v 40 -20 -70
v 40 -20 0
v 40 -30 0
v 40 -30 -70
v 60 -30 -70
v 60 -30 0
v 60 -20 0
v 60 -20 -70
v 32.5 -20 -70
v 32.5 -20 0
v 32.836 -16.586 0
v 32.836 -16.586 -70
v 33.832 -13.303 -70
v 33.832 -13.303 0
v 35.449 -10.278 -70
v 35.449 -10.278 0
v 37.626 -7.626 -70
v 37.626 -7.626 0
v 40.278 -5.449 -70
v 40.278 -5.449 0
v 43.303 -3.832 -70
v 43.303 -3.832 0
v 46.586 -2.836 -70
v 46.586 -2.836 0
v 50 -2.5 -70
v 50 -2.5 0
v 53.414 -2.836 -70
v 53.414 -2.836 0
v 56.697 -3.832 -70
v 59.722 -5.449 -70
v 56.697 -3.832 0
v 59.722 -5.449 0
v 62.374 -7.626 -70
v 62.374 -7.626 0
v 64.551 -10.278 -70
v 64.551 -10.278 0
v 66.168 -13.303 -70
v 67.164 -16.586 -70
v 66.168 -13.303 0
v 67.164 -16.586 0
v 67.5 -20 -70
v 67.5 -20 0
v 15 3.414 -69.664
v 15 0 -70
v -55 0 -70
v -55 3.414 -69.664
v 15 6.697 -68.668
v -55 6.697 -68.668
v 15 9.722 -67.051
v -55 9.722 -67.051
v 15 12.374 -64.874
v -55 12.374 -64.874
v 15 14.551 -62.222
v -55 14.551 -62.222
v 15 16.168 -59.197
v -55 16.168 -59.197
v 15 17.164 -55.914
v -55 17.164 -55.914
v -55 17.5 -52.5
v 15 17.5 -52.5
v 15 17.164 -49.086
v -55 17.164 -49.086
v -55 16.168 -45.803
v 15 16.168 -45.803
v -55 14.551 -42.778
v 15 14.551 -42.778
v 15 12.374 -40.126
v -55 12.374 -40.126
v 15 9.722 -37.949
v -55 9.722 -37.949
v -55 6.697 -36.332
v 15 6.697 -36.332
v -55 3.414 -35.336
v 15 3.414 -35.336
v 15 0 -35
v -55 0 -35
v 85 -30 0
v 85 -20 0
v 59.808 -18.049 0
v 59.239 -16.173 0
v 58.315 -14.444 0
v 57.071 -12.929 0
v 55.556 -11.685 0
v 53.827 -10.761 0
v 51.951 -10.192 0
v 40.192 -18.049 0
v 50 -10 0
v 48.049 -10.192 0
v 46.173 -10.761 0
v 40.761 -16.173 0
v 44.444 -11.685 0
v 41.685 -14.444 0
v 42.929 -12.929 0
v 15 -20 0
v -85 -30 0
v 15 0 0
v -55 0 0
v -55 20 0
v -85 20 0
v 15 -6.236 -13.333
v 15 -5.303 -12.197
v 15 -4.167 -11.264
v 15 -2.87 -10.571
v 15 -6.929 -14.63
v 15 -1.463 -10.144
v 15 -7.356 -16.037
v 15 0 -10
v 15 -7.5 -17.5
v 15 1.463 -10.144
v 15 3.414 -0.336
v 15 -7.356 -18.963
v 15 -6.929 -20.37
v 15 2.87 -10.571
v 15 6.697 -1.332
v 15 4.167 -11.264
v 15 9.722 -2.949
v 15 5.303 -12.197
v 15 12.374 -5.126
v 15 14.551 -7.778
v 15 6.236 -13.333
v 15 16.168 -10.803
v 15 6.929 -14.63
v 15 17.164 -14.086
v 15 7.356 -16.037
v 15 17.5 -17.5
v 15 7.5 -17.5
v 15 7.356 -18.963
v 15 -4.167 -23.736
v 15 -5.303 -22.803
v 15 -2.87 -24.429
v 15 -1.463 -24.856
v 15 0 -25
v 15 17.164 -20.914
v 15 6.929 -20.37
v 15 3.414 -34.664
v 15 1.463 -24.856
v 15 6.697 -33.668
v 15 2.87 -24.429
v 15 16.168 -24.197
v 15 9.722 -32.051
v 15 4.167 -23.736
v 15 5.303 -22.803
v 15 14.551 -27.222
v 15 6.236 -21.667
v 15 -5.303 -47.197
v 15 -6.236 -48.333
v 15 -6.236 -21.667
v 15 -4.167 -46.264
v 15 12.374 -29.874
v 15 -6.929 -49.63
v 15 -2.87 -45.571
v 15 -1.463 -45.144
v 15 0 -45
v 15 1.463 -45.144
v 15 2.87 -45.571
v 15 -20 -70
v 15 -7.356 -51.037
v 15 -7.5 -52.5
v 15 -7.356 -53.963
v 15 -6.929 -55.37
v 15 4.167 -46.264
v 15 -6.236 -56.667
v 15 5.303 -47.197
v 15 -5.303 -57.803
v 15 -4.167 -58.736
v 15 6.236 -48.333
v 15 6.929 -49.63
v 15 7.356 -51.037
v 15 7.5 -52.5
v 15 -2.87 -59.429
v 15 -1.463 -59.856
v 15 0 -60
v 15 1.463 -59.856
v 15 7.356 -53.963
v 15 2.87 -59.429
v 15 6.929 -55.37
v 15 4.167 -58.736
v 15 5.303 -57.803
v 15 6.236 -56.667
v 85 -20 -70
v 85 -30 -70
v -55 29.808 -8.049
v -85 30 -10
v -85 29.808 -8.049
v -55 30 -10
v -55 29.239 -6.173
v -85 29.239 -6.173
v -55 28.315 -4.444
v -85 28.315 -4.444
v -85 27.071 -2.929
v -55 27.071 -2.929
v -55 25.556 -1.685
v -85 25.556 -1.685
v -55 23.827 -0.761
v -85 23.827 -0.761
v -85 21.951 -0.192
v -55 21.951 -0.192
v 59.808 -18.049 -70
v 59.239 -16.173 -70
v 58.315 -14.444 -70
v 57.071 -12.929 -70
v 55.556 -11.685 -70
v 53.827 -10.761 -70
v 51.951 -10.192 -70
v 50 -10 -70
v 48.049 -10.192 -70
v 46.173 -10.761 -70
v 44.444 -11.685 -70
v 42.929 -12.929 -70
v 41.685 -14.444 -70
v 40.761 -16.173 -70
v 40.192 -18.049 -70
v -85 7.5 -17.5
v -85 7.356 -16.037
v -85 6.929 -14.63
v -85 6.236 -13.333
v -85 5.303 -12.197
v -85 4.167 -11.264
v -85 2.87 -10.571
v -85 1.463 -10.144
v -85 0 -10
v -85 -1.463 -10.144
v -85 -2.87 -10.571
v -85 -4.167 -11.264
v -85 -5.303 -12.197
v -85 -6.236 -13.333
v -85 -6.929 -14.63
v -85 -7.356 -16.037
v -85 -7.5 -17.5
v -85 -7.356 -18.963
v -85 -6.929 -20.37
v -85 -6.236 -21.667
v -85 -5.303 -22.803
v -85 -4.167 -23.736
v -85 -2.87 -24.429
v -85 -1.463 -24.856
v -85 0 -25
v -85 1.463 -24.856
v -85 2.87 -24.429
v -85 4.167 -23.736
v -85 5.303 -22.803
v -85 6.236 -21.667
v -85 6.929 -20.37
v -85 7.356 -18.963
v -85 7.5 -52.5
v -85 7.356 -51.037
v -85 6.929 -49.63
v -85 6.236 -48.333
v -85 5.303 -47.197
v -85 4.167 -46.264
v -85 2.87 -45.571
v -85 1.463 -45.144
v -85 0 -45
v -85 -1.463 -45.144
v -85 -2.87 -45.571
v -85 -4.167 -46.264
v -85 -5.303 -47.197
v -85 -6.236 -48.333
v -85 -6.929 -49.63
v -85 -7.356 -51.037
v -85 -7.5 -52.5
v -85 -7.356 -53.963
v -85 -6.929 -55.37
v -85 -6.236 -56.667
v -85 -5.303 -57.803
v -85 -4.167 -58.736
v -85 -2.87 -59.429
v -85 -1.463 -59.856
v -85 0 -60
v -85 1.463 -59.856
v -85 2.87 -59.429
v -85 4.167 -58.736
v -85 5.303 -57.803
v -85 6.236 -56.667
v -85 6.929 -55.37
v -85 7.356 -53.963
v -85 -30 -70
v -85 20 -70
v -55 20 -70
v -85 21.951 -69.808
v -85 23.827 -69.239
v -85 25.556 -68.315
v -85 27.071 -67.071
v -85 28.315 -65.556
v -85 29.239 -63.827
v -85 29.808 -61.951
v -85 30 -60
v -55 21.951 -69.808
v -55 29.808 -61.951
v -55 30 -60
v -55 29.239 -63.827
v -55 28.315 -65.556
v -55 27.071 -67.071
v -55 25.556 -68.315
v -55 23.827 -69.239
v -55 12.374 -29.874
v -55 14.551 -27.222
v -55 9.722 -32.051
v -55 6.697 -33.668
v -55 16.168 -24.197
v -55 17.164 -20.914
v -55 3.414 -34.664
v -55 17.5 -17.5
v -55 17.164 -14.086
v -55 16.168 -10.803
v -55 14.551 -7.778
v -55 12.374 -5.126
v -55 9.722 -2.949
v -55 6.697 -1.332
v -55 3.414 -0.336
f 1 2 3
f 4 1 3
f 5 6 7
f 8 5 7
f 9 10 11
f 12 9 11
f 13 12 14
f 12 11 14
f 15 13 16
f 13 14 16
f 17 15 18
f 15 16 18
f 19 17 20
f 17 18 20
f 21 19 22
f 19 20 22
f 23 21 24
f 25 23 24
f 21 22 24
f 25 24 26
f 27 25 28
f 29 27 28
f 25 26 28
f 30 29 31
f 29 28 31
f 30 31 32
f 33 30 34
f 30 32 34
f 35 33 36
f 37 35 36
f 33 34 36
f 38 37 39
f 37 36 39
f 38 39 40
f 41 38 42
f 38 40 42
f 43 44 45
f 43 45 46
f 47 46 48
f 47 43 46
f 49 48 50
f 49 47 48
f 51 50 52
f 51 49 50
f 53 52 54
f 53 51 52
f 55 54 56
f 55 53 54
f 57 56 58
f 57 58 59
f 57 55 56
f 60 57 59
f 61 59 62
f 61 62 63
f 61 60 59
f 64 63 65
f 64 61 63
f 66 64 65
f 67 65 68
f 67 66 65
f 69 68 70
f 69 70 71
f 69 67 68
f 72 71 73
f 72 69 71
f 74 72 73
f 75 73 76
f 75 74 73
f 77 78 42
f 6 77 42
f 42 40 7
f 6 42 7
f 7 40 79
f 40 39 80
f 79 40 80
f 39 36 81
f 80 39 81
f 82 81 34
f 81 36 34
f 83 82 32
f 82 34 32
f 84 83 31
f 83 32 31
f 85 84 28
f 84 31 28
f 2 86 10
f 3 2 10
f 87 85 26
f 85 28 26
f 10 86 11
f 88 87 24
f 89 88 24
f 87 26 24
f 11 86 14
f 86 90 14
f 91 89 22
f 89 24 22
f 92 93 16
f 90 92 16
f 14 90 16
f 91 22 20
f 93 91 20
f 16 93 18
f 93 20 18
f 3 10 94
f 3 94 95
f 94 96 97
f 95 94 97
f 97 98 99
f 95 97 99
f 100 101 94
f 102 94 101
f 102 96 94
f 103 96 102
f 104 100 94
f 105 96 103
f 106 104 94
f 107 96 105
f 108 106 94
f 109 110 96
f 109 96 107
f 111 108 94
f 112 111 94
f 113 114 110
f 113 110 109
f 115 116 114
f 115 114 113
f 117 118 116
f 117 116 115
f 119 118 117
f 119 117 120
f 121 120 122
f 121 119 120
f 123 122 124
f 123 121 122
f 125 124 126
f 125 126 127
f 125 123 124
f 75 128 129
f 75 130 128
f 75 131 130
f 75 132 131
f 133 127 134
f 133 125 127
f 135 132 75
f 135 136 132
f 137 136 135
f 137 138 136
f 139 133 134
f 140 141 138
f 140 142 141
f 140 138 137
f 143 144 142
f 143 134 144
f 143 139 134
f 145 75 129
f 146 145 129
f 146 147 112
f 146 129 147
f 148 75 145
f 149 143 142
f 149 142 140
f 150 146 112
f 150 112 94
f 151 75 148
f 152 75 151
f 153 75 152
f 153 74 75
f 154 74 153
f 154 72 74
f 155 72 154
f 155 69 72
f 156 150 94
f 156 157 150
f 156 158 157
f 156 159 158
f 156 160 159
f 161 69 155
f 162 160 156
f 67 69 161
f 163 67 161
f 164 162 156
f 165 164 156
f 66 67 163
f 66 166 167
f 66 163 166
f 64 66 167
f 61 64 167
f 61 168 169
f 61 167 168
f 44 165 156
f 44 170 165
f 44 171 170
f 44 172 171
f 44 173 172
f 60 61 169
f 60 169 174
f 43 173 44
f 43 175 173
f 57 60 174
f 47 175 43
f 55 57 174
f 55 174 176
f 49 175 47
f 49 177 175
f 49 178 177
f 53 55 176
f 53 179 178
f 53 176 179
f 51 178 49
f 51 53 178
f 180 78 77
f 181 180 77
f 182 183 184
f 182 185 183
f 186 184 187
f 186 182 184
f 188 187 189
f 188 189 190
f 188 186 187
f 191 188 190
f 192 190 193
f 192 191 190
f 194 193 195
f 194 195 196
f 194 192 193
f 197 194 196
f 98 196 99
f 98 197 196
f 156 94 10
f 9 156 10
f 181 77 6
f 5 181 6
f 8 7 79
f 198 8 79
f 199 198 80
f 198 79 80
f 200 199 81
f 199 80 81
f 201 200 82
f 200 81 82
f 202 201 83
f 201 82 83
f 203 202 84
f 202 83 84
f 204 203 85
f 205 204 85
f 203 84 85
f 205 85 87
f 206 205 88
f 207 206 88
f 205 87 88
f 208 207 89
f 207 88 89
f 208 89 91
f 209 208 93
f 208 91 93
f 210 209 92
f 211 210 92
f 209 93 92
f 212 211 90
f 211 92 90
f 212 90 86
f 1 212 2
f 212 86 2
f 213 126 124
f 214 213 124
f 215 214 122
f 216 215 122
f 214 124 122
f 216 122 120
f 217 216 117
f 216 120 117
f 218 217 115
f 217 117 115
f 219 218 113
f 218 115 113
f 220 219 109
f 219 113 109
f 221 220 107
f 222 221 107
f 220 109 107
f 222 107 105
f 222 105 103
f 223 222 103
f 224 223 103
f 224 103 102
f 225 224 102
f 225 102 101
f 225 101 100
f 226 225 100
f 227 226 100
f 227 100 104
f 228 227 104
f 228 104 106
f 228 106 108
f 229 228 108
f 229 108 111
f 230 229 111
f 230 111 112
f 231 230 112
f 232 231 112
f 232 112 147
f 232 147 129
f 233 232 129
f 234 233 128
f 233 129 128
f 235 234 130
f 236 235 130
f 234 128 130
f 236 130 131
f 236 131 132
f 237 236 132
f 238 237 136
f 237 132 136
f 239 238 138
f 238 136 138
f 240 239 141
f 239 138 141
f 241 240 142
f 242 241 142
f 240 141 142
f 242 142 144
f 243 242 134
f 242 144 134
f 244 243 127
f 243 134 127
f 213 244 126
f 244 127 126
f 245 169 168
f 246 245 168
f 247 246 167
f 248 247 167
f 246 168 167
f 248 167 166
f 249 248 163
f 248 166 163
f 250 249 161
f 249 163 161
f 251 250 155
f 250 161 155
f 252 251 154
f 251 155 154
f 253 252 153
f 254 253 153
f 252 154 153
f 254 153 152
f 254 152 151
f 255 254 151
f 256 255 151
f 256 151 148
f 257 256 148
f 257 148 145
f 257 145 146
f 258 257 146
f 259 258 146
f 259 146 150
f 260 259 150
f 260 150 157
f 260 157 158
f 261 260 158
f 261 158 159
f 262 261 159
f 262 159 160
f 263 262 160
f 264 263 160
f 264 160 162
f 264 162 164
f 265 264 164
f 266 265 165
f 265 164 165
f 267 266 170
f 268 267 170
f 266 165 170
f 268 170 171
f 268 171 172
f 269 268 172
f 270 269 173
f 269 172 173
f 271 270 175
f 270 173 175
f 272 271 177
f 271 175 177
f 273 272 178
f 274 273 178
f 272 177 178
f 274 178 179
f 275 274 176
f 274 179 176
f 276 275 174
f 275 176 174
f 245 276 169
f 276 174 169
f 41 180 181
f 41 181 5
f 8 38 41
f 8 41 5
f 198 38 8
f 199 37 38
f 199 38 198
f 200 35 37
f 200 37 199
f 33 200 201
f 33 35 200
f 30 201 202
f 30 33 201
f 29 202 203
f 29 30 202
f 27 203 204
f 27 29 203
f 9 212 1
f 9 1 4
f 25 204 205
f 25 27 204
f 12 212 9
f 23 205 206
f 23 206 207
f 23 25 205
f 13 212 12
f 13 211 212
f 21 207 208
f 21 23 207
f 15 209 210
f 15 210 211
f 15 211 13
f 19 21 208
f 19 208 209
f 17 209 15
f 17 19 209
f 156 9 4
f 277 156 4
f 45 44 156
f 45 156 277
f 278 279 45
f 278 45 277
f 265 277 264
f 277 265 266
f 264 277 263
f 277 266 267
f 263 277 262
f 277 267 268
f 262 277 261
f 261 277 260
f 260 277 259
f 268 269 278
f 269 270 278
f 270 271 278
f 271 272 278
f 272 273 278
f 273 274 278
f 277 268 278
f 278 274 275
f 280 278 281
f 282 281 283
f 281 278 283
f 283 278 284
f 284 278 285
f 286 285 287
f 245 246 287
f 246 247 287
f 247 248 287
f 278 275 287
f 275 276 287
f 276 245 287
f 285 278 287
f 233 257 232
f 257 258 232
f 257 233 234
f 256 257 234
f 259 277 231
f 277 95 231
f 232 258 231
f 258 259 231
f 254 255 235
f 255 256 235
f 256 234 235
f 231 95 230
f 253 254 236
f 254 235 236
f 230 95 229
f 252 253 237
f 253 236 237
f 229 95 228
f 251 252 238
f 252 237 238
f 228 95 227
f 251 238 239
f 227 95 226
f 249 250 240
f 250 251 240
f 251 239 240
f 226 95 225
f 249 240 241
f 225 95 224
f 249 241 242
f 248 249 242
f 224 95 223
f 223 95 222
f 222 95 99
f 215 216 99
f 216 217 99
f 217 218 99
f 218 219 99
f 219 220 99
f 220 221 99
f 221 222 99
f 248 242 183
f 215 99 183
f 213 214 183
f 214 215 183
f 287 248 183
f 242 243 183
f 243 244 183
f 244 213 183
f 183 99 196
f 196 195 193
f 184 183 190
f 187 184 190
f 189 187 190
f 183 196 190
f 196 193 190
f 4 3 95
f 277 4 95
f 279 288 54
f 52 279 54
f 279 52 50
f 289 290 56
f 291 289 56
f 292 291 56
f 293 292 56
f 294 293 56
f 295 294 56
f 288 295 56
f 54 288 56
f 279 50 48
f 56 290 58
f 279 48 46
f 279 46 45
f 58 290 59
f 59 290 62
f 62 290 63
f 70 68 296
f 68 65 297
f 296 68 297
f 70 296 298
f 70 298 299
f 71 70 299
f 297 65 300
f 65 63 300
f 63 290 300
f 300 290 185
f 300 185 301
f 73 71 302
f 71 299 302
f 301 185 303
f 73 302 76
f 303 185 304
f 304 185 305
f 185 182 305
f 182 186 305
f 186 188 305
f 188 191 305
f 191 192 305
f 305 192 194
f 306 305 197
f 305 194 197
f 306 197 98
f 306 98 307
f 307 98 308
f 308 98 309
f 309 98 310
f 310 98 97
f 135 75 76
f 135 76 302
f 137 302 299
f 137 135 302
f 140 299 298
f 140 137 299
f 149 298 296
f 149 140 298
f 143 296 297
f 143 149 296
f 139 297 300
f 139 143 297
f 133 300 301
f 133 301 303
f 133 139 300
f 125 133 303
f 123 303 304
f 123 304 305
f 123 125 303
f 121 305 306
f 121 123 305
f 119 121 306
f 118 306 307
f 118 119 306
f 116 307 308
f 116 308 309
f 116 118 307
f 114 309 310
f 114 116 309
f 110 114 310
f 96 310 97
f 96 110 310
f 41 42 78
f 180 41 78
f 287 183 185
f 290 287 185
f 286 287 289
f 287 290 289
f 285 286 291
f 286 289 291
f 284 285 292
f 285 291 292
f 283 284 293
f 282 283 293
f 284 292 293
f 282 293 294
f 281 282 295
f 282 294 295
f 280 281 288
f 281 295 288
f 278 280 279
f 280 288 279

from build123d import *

# Parameters (mm, degrees)
BOSS_EXTRUDE1_DEPTH = 70
FILLET1_R           = 10
FILLET2_R           = 10
BOSS_EXTRUDE2_DEPTH = 70
SKETCH3_R           = 7.5
CUT_EXTRUDE1_DEPTH  = 185


with BuildPart() as part:
    # Sketch1 → Boss-Extrude1 (new body)
    with BuildSketch(Plane.XY):
        with BuildLine():
            Line((67.5, -20), (85, -20))
            Line((85, -20), (85, -30))
            Line((85, -30), (60, -30))
            Line((60, -30), (60, -20))
            ThreePointArc((60, -20), (50, -10), (40, -20))
            Line((40, -20), (40, -30))
            Line((40, -30), (-85, -30))
            Line((-85, -30), (-85, 30))
            Line((-85, 30), (-55, 30))
            Line((-55, 30), (-55, 0))
            Line((-55, 0), (15, 0))
            Line((15, 0), (15, -20))
            Line((15, -20), (32.5, -20))
            ThreePointArc((32.5, -20), (50, -2.5), (67.5, -20))
        make_face()
    extrude(amount=-BOSS_EXTRUDE1_DEPTH)

    # Fillet1
    fillet1_edges = [part.edges().sort_by_distance(p)[0] for p in [
        (-70, 30, 0),
    ]]
    fillet(fillet1_edges, radius=FILLET1_R)

    # Fillet2
    fillet2_edges = [part.edges().sort_by_distance(p)[0] for p in [
        (-70, 30, -70),
    ]]
    fillet(fillet2_edges, radius=FILLET2_R)

    # Sketch2 → Boss-Extrude2 (add)
    with BuildSketch(Plane(origin=(15, 0, 0), x_dir=(0, 0, -1), z_dir=(1, 0, 0))):
        with BuildLine():
            ThreePointArc((35, 0), (17.5, 17.5), (0, 0))
            Line((0, 0), (35, 0))
        make_face()
        with BuildLine():
            ThreePointArc((70, 0), (52.5, 17.5), (35, 0))
            Line((35, 0), (70, 0))
        make_face()
    extrude(amount=-BOSS_EXTRUDE2_DEPTH)

    # Sketch3 → Cut-Extrude1 (cut)
    with BuildSketch(Plane(origin=(15, 0, 0), x_dir=(0, 0, -1), z_dir=(1, 0, 0))):
        with Locations(Location((17.5, 0, 0), (0, 0, 90))):
            Circle(SKETCH3_R)
        with Locations(Location((52.5, 0, 0), (0, 0, 90))):
            Circle(SKETCH3_R)
    extrude(amount=-CUT_EXTRUDE1_DEPTH, mode=Mode.SUBTRACT)


solid = part.part
